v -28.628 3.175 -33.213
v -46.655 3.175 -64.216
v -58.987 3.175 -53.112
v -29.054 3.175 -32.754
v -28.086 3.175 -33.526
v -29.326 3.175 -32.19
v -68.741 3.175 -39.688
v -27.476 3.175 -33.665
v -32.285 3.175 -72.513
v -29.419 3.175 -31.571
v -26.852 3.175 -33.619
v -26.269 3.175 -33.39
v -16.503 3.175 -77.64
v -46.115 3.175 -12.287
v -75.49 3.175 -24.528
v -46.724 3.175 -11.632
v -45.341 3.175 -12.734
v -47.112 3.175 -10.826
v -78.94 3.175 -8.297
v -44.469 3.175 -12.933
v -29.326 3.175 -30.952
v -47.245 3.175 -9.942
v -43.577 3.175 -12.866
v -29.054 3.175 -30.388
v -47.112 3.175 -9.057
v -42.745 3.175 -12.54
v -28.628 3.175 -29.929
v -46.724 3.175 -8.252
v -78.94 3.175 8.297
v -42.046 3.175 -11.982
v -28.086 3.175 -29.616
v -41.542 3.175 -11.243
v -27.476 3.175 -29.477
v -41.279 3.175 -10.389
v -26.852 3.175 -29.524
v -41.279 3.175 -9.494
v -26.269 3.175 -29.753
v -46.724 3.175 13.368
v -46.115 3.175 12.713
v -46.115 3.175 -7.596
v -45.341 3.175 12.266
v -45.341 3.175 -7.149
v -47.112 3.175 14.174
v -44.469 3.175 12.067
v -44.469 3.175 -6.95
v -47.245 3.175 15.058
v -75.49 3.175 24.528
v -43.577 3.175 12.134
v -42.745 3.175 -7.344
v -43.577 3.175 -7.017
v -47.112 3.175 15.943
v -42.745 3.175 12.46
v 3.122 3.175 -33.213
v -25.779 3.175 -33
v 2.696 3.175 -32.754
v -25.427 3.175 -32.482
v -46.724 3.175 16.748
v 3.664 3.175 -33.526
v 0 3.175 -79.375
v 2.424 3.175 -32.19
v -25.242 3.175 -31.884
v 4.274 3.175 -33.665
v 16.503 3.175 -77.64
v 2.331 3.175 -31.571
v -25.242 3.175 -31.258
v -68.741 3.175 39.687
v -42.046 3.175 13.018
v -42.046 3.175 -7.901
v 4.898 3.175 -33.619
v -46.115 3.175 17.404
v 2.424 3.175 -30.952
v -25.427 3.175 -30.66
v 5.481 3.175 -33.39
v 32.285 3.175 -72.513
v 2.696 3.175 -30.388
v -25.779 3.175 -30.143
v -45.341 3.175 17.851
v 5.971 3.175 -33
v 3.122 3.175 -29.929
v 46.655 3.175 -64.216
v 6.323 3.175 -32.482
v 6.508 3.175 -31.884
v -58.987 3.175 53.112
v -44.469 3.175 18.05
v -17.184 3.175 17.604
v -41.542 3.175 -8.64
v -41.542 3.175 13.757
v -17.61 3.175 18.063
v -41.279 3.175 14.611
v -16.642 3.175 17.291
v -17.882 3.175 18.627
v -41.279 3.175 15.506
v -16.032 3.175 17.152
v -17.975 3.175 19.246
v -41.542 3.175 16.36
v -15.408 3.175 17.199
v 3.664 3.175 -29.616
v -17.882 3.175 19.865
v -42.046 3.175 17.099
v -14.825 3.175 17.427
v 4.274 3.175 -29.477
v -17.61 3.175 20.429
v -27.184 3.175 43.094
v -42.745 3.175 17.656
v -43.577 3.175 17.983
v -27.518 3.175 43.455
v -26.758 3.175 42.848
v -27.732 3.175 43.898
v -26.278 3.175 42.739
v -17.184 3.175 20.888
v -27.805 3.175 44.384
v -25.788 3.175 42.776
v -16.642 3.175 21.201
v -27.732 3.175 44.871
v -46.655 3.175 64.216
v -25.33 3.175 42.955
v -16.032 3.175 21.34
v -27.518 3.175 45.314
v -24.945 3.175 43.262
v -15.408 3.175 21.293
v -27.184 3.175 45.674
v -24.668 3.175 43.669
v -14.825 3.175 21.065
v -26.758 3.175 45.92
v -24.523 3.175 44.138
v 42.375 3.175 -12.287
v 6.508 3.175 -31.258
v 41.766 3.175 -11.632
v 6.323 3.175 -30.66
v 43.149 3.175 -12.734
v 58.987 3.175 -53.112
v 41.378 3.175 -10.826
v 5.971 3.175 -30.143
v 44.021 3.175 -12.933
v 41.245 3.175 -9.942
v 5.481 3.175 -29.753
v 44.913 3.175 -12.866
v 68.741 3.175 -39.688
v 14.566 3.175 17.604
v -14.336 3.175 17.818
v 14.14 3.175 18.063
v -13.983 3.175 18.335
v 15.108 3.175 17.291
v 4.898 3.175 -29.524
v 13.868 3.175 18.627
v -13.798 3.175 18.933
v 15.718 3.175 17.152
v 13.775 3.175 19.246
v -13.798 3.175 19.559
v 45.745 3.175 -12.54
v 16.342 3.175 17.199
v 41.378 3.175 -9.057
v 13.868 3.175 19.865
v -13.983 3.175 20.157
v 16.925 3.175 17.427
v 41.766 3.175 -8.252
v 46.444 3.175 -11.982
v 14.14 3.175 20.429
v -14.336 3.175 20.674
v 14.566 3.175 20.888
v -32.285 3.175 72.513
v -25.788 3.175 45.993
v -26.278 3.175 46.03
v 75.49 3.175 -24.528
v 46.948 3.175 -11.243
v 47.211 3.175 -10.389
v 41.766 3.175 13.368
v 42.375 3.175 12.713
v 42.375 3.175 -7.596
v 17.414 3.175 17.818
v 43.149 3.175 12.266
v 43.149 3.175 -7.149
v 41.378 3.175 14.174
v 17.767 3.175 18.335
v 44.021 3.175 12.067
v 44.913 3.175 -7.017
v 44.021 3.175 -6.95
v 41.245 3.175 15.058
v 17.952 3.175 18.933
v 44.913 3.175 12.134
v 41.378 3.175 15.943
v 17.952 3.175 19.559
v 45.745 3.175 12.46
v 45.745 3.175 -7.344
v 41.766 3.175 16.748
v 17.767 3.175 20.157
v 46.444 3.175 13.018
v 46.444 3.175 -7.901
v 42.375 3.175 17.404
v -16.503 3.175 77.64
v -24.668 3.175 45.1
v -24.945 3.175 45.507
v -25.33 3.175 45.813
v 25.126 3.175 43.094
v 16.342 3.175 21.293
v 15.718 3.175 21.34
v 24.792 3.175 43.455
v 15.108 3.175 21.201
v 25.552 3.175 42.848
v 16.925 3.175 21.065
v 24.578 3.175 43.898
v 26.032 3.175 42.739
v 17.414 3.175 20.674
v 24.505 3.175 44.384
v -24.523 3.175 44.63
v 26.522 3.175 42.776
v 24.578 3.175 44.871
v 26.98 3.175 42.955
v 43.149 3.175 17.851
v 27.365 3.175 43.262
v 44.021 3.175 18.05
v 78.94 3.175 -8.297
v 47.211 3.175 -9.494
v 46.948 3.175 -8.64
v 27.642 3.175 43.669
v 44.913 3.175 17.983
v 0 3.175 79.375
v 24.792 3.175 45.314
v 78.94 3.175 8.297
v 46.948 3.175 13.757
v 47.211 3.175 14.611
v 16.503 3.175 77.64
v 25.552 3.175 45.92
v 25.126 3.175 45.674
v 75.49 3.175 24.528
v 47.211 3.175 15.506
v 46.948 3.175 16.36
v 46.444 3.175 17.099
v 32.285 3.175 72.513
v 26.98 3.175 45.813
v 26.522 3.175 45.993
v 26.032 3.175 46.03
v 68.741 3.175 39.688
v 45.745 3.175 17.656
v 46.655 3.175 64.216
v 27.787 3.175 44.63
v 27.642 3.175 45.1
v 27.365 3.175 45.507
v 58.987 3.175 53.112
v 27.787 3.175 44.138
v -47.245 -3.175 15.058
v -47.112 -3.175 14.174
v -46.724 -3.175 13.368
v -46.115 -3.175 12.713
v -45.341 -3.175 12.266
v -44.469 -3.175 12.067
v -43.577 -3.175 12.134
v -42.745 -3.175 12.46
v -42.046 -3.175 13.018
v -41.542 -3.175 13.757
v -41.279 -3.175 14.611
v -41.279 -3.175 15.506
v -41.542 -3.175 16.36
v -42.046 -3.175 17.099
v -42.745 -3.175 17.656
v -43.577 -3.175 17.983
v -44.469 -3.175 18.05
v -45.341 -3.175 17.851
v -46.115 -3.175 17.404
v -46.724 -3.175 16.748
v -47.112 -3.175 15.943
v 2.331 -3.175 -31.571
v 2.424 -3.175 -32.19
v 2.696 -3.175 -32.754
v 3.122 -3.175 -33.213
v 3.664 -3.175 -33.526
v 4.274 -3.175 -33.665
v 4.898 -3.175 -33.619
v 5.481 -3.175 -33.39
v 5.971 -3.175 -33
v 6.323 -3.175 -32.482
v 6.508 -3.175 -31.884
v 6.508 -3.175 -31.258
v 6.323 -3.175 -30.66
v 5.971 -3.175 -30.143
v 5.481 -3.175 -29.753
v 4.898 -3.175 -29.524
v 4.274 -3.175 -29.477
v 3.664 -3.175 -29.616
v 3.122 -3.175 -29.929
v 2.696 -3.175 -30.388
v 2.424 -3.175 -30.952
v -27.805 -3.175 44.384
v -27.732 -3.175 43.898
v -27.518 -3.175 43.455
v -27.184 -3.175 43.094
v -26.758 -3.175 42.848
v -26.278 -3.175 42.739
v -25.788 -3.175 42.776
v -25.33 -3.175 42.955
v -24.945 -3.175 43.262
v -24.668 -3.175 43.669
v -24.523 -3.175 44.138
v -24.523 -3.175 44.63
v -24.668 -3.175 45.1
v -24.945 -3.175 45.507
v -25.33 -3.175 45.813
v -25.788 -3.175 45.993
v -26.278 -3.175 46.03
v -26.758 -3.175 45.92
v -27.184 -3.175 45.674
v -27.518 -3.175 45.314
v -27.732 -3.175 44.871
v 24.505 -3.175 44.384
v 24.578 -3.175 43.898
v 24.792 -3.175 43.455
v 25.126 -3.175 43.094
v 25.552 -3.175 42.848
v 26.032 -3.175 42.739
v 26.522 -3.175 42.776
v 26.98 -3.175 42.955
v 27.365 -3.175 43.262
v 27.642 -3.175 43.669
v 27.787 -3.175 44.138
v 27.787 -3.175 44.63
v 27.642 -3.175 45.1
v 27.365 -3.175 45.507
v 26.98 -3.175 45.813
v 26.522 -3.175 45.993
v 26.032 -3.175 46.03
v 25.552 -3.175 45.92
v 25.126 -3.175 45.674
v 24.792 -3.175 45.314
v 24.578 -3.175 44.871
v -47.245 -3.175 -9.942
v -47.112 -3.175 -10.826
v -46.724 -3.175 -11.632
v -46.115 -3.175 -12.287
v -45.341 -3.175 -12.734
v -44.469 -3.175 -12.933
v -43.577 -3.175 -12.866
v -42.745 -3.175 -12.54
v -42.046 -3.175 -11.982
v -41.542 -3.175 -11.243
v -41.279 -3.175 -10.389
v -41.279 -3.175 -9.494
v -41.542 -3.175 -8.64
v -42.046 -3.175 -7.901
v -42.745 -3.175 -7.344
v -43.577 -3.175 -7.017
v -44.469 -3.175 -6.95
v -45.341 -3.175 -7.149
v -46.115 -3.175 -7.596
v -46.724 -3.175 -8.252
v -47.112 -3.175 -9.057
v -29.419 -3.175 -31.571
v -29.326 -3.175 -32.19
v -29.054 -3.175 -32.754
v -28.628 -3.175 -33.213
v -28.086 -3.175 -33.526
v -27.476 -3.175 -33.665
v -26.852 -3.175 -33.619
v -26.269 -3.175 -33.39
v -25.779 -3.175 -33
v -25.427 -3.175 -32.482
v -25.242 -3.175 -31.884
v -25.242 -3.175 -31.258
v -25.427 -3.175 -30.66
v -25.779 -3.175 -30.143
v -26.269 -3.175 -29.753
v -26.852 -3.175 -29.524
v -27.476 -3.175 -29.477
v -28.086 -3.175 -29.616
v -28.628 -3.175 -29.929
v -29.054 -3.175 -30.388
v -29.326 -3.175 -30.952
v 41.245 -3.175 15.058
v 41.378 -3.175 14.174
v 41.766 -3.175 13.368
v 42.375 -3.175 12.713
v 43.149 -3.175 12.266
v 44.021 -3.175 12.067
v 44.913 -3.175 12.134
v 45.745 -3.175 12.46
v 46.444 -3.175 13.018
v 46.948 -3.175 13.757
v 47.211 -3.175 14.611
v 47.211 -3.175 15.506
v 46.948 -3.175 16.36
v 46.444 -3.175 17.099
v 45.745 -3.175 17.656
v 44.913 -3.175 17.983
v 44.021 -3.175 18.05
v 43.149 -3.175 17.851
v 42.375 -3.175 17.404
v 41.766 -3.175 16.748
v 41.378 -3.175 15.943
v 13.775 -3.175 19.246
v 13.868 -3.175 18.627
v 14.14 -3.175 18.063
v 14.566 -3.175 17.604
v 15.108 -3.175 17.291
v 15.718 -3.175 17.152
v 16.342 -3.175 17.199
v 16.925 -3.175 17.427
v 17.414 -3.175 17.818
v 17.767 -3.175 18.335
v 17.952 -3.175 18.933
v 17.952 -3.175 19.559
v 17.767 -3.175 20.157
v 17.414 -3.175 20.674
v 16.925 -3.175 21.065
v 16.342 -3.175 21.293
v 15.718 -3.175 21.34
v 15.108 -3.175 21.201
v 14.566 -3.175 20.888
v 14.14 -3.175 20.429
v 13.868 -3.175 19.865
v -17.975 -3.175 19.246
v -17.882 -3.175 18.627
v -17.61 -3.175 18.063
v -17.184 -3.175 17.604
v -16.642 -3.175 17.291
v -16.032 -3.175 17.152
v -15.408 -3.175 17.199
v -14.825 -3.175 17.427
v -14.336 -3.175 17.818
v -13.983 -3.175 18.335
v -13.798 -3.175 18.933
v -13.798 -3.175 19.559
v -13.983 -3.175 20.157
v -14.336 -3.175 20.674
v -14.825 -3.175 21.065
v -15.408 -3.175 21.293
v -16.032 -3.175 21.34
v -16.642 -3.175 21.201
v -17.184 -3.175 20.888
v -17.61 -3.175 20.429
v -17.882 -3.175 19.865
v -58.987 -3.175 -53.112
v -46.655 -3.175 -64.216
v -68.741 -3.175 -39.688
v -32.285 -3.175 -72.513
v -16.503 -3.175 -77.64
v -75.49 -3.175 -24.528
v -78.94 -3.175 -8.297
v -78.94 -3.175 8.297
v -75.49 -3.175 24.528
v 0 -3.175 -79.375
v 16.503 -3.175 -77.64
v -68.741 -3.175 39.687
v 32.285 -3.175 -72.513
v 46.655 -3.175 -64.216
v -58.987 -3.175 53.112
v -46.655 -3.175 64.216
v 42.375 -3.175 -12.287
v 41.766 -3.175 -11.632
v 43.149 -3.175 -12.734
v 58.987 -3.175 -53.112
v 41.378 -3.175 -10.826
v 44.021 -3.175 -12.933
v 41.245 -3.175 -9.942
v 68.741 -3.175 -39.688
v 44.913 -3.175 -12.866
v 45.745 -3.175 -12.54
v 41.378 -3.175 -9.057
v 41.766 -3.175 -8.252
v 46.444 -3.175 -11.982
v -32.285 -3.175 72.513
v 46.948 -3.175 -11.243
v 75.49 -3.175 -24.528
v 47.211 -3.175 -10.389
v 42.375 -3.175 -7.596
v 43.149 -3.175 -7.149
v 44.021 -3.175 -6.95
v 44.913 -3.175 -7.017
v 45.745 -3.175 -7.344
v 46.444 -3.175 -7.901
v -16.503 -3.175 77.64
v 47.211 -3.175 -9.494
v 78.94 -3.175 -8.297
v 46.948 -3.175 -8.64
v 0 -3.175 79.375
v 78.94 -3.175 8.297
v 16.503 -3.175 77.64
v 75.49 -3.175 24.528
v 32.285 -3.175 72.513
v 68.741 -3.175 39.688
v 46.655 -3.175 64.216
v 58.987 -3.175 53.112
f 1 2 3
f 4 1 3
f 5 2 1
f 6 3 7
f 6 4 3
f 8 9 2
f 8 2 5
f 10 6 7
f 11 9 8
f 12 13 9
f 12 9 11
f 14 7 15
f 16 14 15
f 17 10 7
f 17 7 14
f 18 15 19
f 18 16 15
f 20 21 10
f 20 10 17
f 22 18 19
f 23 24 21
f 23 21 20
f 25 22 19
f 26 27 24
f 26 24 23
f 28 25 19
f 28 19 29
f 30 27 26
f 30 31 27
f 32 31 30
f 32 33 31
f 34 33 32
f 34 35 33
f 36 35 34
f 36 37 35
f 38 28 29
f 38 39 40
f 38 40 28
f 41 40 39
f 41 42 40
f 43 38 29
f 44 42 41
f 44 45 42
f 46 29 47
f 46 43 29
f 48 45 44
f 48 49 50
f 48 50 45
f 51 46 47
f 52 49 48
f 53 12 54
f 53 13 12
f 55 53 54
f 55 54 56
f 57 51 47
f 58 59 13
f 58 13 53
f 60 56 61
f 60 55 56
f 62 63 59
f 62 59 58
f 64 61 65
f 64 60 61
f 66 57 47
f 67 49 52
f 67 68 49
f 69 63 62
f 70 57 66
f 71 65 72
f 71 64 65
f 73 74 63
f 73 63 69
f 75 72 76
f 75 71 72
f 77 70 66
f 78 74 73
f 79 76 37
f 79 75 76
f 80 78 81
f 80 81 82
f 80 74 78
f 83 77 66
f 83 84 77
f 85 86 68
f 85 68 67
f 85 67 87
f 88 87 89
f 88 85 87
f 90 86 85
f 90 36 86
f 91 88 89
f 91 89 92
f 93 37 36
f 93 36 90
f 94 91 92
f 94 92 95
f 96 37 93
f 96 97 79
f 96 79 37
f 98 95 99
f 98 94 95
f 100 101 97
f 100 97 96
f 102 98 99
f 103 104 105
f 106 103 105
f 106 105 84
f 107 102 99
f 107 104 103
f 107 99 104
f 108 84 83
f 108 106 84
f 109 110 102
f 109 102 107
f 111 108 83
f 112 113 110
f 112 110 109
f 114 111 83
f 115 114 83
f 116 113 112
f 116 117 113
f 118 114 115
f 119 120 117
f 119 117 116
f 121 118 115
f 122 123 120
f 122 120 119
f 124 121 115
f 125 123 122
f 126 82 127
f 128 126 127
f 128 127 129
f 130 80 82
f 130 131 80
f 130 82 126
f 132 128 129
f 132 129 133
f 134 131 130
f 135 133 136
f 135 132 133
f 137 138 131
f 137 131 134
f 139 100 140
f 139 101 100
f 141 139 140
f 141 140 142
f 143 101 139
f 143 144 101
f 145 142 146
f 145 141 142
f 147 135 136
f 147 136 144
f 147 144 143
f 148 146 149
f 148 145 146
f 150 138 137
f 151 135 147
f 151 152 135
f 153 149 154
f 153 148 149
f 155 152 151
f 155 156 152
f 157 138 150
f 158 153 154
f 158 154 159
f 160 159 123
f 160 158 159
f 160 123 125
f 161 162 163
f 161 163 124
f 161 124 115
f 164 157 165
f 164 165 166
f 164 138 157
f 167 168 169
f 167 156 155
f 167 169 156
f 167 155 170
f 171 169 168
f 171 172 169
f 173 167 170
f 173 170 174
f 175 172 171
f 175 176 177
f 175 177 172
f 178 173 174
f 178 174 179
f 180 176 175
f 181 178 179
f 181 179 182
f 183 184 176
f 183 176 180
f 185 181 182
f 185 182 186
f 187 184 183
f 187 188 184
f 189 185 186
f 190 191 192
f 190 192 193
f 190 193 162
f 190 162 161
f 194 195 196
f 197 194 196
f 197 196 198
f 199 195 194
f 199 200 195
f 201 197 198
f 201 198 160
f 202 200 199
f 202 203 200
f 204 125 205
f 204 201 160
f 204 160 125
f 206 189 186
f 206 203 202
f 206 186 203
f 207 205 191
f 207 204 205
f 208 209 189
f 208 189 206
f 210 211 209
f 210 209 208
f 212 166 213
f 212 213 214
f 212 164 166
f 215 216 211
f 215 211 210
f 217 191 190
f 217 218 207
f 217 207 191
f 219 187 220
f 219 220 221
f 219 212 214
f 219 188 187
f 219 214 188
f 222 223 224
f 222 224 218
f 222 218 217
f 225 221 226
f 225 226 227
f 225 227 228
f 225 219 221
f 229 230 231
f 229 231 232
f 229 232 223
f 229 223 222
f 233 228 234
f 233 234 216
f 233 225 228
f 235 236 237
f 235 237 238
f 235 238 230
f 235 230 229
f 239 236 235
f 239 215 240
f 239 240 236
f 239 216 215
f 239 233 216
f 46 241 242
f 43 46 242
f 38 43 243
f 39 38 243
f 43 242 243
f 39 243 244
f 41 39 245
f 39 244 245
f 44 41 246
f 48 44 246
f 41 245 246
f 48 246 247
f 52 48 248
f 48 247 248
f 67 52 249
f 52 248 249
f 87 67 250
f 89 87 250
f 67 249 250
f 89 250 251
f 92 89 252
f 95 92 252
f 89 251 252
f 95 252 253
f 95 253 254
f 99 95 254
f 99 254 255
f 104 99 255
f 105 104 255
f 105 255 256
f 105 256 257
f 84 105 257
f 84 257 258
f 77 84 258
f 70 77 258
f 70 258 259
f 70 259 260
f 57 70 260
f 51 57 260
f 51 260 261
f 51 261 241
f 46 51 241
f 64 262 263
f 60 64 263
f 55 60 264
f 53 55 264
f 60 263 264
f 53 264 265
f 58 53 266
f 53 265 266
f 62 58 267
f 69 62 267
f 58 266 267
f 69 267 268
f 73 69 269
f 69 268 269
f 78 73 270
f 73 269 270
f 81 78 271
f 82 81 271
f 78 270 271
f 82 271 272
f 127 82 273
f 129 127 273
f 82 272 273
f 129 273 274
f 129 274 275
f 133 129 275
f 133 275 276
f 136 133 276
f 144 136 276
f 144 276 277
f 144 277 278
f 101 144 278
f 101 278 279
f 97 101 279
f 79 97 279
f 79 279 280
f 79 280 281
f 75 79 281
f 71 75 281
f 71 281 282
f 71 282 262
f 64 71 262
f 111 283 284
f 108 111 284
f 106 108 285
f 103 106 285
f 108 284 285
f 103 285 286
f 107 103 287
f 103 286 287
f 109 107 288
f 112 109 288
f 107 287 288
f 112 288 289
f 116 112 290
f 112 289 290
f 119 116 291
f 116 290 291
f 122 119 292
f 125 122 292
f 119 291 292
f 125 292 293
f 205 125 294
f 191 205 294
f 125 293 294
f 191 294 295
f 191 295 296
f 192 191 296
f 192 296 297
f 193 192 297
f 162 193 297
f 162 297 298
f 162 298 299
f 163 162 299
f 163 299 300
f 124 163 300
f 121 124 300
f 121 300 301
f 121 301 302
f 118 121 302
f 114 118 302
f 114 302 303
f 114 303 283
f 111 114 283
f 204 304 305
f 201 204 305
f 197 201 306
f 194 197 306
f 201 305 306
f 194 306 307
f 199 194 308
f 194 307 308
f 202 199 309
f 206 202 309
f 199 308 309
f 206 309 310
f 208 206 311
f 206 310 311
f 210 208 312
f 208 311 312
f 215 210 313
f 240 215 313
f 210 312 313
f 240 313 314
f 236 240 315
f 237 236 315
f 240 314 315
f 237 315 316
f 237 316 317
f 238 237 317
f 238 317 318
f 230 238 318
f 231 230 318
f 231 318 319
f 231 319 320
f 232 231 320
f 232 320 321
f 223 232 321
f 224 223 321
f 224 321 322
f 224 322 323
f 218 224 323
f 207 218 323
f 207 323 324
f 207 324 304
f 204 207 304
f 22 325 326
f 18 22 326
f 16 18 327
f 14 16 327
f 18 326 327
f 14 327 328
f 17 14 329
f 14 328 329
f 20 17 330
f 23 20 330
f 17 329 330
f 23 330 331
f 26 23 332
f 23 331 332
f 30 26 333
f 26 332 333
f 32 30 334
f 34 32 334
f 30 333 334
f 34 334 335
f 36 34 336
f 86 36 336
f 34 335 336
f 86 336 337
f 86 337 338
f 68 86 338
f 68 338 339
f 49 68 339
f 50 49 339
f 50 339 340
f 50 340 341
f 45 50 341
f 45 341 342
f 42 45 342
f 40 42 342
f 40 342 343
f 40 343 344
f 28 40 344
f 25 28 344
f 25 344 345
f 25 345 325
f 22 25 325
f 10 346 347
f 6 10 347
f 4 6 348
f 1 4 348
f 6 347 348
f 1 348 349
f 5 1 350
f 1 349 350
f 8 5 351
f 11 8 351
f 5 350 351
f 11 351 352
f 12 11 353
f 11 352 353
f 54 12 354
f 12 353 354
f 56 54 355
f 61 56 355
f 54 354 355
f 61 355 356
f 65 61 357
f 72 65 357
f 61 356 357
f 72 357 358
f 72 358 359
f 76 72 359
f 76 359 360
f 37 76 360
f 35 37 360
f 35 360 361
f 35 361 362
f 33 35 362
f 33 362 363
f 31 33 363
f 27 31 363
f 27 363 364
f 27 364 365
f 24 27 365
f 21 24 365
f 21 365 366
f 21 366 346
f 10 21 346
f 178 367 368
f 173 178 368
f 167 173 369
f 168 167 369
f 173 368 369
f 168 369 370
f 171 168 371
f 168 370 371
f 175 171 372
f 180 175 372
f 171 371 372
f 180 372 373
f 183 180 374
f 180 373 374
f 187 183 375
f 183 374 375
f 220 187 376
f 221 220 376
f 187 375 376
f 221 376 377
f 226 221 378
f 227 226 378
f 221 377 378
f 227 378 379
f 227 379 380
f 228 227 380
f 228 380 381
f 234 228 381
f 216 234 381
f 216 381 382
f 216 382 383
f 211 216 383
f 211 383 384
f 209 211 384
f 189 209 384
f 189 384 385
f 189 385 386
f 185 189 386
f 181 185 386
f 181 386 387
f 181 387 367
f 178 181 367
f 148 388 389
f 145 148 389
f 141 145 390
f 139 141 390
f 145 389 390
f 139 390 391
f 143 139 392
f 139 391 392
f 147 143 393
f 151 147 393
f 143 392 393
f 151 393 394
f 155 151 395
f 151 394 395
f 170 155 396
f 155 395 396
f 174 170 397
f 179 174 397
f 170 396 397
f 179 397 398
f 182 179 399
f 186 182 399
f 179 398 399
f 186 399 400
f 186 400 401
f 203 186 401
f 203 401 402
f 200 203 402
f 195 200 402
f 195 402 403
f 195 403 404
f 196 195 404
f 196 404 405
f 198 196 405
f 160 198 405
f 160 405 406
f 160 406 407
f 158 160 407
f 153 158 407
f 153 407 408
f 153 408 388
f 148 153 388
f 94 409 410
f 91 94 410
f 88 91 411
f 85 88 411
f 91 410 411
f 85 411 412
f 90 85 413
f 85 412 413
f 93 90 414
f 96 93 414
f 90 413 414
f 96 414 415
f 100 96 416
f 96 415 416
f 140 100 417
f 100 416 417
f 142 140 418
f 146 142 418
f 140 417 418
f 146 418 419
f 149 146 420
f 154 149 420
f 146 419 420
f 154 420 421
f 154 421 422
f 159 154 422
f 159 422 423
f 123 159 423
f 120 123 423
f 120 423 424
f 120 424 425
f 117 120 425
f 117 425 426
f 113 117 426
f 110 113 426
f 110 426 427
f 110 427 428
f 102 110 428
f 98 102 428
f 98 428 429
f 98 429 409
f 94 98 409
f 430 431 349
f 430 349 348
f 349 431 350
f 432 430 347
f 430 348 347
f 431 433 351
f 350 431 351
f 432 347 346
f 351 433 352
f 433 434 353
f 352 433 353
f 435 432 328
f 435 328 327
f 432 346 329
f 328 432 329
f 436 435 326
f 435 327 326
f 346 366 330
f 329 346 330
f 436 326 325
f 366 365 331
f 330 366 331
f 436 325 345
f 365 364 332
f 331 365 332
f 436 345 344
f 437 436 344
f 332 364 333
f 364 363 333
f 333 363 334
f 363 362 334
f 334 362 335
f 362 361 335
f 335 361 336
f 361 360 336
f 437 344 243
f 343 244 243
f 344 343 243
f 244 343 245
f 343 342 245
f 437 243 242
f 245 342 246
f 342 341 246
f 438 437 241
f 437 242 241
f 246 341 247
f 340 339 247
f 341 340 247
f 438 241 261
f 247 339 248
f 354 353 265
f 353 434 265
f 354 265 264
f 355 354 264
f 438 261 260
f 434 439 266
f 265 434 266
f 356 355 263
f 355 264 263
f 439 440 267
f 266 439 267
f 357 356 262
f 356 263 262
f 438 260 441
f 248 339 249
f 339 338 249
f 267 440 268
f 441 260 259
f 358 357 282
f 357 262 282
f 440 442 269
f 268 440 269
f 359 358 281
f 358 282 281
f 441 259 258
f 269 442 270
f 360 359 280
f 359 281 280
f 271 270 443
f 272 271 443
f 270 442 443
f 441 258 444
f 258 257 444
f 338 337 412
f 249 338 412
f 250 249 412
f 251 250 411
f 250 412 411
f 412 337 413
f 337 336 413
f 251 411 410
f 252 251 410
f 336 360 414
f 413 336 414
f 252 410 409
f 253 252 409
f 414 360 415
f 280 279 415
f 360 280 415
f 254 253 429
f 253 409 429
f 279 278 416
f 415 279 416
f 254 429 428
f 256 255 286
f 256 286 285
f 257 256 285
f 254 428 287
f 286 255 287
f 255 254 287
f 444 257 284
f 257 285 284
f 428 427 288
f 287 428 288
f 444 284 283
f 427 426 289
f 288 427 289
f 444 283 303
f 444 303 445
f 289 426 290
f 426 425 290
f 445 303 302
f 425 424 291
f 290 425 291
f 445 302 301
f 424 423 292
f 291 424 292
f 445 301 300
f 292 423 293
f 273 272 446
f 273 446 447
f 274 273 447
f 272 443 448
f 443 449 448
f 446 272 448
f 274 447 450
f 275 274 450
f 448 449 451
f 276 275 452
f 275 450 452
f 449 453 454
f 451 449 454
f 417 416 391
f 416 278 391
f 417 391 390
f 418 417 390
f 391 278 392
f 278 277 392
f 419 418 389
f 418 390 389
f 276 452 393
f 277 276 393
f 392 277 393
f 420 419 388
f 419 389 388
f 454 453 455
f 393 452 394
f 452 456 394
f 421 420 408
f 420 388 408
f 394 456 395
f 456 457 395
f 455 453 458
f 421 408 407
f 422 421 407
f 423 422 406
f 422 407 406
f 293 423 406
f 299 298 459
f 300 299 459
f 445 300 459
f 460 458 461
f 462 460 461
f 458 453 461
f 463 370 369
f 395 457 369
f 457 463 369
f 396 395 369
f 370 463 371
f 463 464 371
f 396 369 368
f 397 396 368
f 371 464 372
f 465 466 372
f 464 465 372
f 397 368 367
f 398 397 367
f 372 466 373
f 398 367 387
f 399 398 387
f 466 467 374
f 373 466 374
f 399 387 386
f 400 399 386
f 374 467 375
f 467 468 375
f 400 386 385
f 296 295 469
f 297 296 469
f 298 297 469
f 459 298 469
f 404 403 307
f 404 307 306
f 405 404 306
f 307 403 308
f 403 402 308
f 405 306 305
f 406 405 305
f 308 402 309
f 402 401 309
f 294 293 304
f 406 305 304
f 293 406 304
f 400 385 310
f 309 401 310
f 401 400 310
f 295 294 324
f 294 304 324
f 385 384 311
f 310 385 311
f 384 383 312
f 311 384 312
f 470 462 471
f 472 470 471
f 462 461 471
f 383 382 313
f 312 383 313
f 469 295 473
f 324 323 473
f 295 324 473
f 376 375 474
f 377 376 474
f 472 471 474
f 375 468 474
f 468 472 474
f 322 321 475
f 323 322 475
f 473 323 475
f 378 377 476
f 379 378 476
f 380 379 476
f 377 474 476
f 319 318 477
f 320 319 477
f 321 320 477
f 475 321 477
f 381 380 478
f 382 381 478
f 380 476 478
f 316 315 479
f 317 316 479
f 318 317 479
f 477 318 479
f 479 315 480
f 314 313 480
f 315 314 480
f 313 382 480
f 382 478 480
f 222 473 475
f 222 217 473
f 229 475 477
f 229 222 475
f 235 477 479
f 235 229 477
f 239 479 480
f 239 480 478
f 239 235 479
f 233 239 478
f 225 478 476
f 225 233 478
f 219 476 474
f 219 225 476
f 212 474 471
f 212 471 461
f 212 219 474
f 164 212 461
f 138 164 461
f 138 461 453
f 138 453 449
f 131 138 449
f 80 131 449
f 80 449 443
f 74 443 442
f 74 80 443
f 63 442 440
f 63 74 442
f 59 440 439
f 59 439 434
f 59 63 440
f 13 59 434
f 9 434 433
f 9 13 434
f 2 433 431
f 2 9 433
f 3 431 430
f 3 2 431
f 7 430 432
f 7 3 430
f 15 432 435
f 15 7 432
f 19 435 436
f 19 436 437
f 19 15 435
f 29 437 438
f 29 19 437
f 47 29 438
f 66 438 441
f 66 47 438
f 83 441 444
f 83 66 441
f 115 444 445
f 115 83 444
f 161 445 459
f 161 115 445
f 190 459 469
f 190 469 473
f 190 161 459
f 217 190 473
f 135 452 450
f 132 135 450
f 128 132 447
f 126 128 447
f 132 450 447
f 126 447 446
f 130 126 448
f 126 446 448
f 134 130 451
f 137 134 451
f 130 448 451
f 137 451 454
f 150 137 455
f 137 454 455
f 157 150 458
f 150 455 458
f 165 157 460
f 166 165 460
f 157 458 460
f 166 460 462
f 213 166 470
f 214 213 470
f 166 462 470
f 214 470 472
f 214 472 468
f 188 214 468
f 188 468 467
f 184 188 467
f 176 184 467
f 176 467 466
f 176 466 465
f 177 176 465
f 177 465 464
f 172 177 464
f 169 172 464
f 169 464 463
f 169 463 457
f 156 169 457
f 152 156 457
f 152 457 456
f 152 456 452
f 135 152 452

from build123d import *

# Parameters (mm, degrees)
SKETCH1_R                   = 79.375
BOSS_EXTRUDE1_DEPTH         = 3.175
TAP_DRILL_FOR_M5X0_8_TAP1_D = 4.2
TAP_DRILL_FOR_M7X1_0_TAP1_D = 6
TAP_DRILL_FOR_M4X0_7_TAP1_D = 3.3


with BuildPart() as part:
    # Sketch1 → Boss-Extrude1 (new, symmetric)
    with BuildSketch(Plane(origin=(0, 0, 0), x_dir=(1, 0, 0), z_dir=(0, 1, 0))):
        with Locations(Location((0, 0, 0), (0, 0, 270))):
            Circle(SKETCH1_R)
    extrude(amount=BOSS_EXTRUDE1_DEPTH, both=True)

    # Tap Drill for M5x0.8 Tap1 (through all)
    with Locations(Plane(origin=(0, 3.175, 0), x_dir=(1, 0, 0), z_dir=(0, 1, 0))):
        with Locations((-27.3188086, 31.571183672), (4.4311914, 31.571183672), (-15.875, -19.245910728), (15.875, -19.245910728)):
            Hole(TAP_DRILL_FOR_M5X0_8_TAP1_D / 2)

    # Tap Drill for M7x1.0 Tap1 (through all)
    with Locations(Plane(origin=(0, 3.175, 0), x_dir=(1, 0, 0), z_dir=(0, 1, 0))):
        with Locations((-44.245, 9.941583672), (-44.245, -15.058416328), (44.245, 9.941583672), (44.245, -15.058416328)):
            Hole(TAP_DRILL_FOR_M7X1_0_TAP1_D / 2)

    # Tap Drill for M4x0.7 Tap1 (through all)
    with Locations(Plane(origin=(0, 3.175, 0), x_dir=(1, 0, 0), z_dir=(0, 1, 0))):
        with Locations((-26.155, -44.384416328), (26.155, -44.384416328)):
            Hole(TAP_DRILL_FOR_M4X0_7_TAP1_D / 2)


solid = part.part
